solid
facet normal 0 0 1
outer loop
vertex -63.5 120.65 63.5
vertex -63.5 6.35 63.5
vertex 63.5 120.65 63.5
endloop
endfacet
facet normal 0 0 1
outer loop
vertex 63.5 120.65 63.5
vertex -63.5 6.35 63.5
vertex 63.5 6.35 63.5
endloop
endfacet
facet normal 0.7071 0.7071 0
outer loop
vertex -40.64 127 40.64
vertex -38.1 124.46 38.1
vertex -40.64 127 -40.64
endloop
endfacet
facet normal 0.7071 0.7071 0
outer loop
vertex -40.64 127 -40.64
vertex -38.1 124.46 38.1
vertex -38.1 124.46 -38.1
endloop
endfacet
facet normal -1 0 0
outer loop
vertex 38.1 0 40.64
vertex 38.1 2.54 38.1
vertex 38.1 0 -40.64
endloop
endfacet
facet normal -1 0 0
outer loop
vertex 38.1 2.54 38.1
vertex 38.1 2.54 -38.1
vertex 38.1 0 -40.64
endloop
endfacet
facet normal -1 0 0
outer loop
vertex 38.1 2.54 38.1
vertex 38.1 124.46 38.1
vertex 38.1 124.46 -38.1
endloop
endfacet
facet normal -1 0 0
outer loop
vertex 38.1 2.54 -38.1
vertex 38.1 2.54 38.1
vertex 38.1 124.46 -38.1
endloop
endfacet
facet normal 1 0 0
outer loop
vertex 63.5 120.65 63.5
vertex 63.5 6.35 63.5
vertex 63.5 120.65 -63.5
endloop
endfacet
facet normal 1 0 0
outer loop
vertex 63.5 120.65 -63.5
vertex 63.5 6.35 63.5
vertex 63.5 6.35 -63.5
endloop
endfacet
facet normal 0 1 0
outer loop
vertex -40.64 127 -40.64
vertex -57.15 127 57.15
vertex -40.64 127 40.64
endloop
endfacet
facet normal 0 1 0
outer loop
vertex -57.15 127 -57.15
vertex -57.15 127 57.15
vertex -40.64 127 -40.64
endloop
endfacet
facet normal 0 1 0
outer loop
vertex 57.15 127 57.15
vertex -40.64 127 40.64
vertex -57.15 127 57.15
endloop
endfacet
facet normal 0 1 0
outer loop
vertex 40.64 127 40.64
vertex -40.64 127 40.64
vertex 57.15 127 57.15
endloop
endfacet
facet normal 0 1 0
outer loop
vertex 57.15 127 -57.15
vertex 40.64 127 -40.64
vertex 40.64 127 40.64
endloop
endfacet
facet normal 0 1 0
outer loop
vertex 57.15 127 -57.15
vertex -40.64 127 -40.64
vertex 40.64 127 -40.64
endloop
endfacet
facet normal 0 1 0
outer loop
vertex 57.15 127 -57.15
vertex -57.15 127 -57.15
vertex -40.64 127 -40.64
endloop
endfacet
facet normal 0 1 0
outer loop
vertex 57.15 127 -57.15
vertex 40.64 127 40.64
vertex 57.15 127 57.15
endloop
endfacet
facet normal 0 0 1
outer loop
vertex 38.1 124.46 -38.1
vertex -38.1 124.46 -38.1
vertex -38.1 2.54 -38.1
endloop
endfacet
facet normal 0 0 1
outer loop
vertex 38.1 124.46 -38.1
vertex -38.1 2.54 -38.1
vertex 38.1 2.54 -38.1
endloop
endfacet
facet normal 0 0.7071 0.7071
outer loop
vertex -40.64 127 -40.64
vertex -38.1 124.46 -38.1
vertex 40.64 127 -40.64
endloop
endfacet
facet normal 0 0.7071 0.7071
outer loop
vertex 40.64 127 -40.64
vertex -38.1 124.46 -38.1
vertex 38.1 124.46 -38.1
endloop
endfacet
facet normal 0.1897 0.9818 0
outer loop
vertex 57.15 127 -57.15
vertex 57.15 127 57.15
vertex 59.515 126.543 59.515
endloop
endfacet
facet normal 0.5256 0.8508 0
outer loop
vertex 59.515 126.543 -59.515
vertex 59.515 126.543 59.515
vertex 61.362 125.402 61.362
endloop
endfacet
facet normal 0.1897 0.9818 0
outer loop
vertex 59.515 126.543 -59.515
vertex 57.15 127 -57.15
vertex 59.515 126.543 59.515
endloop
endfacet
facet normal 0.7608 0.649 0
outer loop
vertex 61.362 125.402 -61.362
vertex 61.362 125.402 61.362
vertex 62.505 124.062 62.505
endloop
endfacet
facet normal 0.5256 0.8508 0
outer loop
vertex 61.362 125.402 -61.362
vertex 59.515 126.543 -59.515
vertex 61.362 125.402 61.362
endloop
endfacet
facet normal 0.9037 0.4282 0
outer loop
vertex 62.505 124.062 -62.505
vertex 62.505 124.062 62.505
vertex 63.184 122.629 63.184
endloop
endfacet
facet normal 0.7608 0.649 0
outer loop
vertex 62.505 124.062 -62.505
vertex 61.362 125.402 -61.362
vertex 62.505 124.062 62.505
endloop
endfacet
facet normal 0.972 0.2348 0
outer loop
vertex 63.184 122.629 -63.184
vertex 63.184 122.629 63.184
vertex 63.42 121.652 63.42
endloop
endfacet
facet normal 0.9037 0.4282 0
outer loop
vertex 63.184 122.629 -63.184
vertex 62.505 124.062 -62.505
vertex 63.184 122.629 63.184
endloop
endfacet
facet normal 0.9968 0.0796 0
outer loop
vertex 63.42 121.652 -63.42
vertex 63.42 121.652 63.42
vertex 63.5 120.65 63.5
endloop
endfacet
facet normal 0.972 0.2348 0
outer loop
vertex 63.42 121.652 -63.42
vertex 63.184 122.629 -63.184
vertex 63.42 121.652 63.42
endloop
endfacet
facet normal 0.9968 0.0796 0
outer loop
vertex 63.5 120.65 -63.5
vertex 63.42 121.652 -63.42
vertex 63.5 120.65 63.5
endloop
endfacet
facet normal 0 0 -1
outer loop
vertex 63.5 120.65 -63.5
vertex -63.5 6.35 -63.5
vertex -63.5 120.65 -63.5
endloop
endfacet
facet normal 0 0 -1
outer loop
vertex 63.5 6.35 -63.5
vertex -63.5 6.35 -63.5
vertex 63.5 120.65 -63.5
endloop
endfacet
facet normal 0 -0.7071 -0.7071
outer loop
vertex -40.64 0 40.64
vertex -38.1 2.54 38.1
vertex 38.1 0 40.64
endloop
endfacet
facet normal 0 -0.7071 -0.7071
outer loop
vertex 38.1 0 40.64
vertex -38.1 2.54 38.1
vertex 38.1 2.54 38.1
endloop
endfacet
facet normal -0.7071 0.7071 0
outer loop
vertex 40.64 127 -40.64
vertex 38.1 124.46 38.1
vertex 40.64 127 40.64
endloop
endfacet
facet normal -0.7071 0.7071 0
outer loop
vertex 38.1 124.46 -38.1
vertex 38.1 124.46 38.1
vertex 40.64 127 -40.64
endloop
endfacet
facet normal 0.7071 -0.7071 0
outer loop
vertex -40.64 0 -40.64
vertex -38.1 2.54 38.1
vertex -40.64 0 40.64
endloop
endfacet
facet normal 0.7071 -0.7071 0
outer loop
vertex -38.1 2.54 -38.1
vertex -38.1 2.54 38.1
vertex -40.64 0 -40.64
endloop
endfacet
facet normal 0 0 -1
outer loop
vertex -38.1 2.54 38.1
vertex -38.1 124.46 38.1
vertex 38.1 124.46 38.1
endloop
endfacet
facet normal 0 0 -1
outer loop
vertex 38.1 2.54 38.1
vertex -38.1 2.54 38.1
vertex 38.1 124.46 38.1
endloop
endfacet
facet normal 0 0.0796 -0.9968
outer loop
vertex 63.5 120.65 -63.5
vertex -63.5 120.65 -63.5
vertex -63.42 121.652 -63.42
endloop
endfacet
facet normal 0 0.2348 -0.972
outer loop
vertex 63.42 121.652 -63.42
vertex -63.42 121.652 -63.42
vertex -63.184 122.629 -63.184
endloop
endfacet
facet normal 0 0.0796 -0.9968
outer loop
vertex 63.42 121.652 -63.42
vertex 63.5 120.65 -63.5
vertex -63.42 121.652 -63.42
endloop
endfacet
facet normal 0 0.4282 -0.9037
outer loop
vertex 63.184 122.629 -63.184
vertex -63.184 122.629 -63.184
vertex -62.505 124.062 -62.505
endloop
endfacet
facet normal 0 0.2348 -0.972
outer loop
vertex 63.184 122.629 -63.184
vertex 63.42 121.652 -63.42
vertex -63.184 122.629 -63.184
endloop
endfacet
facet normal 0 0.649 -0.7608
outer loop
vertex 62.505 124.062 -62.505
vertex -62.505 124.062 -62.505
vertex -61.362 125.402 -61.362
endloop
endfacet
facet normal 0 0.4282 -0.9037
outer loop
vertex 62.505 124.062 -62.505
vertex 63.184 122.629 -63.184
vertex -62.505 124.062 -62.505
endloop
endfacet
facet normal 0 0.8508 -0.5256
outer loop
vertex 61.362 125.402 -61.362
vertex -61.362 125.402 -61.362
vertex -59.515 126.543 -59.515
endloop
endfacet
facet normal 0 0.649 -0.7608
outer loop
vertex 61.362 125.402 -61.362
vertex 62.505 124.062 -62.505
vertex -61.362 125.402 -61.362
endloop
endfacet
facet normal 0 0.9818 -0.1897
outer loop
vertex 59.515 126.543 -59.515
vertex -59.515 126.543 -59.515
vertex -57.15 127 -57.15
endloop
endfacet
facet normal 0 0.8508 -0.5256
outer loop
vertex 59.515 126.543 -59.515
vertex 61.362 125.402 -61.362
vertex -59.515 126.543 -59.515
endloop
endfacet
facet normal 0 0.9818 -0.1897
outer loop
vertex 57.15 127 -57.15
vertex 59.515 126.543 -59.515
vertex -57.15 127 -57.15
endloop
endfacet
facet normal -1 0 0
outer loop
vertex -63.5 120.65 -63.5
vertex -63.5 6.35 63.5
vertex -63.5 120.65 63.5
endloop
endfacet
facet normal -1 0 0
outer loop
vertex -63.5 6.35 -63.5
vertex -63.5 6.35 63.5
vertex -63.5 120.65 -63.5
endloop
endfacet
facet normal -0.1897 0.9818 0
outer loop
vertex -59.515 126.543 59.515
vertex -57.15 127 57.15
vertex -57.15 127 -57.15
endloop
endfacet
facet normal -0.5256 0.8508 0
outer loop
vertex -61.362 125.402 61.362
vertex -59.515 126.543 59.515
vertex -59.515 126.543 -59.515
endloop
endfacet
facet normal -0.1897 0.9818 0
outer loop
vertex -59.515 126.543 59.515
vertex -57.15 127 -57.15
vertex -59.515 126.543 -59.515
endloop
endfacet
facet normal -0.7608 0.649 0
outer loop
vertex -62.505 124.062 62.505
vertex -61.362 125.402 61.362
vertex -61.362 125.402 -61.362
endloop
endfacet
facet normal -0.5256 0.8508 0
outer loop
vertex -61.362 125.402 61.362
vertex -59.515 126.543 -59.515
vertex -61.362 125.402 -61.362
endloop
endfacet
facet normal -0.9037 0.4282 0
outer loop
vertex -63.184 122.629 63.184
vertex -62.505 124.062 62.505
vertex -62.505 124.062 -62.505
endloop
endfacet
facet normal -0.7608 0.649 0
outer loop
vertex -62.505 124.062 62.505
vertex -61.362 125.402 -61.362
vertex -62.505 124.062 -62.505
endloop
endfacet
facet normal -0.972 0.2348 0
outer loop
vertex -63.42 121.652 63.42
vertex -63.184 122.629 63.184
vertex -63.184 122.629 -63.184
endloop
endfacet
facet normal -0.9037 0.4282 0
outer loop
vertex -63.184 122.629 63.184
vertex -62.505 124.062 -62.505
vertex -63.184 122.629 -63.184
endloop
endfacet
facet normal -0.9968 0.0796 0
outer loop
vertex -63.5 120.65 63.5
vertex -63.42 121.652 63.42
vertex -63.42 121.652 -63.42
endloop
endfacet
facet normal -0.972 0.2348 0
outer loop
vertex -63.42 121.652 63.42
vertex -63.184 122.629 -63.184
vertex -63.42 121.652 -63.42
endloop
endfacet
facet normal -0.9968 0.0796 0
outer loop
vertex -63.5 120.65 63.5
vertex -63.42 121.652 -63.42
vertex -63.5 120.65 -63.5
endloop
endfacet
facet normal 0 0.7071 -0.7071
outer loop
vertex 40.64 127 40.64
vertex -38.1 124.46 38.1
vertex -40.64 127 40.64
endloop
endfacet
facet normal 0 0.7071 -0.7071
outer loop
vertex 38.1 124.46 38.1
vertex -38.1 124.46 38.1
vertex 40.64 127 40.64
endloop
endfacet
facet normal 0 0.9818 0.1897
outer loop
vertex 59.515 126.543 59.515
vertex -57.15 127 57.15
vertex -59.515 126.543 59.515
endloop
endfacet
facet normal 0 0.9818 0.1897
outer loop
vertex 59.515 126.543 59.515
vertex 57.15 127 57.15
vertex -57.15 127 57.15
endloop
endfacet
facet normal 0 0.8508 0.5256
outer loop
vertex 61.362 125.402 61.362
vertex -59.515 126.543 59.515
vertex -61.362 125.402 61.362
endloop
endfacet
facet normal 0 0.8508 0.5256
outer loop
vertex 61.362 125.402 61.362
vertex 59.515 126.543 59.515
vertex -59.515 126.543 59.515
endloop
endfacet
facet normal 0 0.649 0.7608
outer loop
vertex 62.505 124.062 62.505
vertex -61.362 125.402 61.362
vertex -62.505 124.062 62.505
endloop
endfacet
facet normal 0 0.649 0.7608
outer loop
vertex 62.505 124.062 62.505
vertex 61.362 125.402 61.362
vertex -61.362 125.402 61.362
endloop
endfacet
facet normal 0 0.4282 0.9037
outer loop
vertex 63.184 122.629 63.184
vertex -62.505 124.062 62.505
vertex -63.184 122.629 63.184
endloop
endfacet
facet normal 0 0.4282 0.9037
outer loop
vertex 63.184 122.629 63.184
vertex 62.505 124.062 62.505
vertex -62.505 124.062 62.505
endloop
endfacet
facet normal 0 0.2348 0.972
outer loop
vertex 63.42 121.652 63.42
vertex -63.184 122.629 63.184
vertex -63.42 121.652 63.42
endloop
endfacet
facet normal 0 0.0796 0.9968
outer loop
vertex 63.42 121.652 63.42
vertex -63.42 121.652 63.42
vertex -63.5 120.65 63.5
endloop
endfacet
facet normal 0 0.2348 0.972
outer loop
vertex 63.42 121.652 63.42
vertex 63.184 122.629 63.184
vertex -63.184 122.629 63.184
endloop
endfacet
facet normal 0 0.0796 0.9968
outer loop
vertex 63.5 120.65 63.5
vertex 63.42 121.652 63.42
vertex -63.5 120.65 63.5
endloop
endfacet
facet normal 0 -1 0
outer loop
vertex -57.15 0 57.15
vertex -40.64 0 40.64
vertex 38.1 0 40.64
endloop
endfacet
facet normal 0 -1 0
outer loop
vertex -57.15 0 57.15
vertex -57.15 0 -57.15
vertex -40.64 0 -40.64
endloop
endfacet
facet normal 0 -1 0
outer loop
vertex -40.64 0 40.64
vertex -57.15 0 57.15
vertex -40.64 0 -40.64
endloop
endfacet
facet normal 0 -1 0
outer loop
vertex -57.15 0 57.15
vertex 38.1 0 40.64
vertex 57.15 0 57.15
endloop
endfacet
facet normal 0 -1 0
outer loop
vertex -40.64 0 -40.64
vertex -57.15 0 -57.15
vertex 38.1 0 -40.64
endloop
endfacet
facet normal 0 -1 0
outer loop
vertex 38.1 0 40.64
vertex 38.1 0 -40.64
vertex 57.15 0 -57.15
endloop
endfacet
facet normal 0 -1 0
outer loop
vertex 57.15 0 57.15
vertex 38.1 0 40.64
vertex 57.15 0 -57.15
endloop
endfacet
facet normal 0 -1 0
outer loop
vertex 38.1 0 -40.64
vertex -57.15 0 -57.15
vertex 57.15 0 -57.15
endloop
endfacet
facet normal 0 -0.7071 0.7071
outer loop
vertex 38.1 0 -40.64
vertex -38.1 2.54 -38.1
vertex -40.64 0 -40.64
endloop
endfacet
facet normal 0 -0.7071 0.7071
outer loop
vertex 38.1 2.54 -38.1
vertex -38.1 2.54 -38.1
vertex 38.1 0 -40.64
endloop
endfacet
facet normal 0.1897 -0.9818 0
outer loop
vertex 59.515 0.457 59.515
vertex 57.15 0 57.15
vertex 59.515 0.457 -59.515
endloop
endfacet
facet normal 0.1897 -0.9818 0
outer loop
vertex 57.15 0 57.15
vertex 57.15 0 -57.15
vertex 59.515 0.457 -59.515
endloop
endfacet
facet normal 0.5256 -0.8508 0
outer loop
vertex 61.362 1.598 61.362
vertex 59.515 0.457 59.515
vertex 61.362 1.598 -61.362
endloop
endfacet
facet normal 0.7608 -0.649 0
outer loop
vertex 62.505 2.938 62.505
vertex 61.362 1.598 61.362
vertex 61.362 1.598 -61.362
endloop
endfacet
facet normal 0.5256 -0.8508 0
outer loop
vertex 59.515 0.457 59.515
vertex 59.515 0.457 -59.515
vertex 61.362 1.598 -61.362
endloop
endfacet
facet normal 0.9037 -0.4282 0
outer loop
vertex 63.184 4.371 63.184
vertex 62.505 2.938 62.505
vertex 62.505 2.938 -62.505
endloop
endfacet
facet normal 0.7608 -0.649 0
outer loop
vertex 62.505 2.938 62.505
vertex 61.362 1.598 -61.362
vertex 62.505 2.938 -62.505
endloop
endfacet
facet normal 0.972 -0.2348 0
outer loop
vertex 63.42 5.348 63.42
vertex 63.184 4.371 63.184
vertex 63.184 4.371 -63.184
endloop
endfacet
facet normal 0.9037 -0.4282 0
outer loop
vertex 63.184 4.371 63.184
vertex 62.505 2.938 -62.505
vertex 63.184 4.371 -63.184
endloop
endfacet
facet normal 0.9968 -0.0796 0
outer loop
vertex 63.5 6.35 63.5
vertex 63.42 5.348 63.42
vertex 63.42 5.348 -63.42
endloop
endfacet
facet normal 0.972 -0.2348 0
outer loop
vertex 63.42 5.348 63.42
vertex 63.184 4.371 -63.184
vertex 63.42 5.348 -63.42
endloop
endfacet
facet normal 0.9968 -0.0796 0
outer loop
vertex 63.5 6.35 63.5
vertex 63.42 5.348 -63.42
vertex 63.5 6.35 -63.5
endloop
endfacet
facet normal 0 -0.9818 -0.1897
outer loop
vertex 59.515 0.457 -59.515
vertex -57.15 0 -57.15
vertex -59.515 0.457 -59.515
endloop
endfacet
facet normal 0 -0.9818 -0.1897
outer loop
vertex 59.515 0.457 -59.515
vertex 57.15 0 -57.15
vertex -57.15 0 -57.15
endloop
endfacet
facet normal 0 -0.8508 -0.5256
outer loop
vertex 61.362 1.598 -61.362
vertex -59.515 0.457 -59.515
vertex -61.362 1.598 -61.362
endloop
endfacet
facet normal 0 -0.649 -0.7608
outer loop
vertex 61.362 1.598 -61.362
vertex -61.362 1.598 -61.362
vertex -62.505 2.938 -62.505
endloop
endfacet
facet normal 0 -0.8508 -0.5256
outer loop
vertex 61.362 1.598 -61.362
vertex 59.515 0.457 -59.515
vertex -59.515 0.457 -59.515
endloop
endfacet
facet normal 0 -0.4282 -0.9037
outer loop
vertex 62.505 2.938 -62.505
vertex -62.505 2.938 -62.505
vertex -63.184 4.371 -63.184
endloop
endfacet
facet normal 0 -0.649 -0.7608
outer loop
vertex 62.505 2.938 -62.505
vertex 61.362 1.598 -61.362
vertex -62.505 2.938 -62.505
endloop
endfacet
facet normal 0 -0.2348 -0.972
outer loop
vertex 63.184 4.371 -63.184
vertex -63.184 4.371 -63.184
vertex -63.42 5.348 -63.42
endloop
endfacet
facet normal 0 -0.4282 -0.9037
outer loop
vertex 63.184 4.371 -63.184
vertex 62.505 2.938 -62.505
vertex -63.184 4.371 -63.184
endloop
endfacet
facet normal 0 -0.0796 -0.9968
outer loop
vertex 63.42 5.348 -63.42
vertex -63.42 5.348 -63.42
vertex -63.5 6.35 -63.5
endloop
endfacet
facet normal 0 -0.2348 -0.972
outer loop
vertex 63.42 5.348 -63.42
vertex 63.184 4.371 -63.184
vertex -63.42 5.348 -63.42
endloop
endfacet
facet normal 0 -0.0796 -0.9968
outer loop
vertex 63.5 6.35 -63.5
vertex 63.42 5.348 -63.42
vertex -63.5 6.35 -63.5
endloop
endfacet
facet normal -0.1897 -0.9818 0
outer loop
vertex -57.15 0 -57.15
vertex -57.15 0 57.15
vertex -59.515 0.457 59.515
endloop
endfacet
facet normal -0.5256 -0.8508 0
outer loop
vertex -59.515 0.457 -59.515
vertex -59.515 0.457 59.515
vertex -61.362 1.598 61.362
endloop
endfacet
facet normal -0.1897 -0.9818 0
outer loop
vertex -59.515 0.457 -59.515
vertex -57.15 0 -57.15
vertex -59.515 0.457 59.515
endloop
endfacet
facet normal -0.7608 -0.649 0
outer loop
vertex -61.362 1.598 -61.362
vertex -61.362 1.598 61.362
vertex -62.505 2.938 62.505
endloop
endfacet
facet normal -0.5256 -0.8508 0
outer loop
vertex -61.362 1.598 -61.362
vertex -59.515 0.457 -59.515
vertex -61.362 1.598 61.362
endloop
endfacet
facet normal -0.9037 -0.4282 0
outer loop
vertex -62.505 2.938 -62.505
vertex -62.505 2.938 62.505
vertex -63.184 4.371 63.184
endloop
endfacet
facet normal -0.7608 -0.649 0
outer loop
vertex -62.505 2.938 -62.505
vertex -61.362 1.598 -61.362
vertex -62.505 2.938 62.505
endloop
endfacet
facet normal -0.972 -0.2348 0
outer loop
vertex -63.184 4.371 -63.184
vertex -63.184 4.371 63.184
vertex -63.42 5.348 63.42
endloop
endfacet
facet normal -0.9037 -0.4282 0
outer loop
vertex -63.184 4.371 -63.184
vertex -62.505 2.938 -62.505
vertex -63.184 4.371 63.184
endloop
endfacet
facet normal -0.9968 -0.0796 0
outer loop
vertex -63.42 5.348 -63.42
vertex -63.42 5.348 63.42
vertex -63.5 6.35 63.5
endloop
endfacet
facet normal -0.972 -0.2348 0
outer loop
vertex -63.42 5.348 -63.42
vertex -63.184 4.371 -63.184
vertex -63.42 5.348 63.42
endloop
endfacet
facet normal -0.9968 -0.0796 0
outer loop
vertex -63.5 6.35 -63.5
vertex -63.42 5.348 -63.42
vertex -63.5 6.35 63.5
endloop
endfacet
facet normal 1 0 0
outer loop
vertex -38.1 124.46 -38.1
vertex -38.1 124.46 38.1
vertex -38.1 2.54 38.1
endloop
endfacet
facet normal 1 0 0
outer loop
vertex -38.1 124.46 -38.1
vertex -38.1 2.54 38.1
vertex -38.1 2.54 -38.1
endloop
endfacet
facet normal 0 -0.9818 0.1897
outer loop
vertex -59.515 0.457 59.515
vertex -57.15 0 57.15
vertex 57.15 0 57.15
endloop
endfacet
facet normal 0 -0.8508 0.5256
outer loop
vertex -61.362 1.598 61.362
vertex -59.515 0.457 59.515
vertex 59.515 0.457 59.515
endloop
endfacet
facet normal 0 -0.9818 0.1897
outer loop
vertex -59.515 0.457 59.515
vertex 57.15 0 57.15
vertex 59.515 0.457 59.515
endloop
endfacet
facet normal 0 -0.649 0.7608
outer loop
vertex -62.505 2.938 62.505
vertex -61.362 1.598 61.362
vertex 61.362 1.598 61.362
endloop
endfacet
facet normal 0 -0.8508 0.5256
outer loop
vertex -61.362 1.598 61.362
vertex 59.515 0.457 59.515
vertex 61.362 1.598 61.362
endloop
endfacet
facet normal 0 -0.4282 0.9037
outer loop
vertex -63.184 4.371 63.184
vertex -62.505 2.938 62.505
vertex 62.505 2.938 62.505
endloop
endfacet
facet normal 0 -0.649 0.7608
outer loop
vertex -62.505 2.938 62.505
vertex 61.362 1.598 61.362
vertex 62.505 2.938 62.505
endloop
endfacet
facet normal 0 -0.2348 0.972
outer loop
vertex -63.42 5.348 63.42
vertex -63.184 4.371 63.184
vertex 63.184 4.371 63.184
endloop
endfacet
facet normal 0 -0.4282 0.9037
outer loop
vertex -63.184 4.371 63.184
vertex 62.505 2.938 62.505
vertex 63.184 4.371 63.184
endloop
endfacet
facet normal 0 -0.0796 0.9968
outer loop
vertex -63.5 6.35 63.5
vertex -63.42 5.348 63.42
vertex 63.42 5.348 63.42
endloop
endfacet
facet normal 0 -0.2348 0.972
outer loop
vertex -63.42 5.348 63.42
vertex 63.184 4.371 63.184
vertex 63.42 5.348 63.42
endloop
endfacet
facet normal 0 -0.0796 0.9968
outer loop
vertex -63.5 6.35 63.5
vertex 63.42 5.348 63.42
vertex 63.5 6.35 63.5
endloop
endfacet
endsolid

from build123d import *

# Parameters (mm, degrees)
SKETCH1_W           = 127
SKETCH1_H           = 127
BOSS_EXTRUDE1_DEPTH = 127
SKETCH2_W           = 76.2
SKETCH2_H           = 76.2
CUT_EXTRUDE1_DEPTH  = 156.542598667
CHAMFER1_SIZE       = 2.54
FILLET1_R           = 6.35


with BuildPart() as part:
    # Sketch1 → Boss-Extrude1 (new body)
    with BuildSketch(Plane(origin=(0, 0, 0), x_dir=(1, 0, 0), z_dir=(0, 1, 0))):
        Rectangle(SKETCH1_W, SKETCH1_H)
    extrude(amount=BOSS_EXTRUDE1_DEPTH)

    # Sketch2 → Cut-Extrude1 (cut, through all)
    with BuildSketch(Plane(origin=(0, 127, 0), x_dir=(1, 0, 0), z_dir=(0, 1, 0))):
        Rectangle(SKETCH2_W, SKETCH2_H)
    extrude(amount=-CUT_EXTRUDE1_DEPTH, mode=Mode.SUBTRACT)

    # Chamfer1
    chamfer1_edges = [part.edges().sort_by_distance(p)[0] for p in [
        (0, 0, 38.1),
        (-38.1, 0, 0),
        (0, 0, -38.1),
        (38.1, 127, 0),
        (0, 127, -38.1),
        (-38.1, 127, 0),
        (0, 127, 38.1),
    ]]
    chamfer(chamfer1_edges, length=CHAMFER1_SIZE)

    # Fillet1
    fillet1_edges = [part.edges().sort_by_distance(p)[0] for p in [
        (-63.5, 127, 0),
        (0, 127, 63.5),
        (63.5, 127, 0),
        (0, 0, 63.5),
        (-63.5, 0, 0),
        (0, 0, -63.5),
        (63.5, 0, 0),
        (0, 127, -63.5),
    ]]
    fillet(fillet1_edges, radius=FILLET1_R)


solid = part.part
